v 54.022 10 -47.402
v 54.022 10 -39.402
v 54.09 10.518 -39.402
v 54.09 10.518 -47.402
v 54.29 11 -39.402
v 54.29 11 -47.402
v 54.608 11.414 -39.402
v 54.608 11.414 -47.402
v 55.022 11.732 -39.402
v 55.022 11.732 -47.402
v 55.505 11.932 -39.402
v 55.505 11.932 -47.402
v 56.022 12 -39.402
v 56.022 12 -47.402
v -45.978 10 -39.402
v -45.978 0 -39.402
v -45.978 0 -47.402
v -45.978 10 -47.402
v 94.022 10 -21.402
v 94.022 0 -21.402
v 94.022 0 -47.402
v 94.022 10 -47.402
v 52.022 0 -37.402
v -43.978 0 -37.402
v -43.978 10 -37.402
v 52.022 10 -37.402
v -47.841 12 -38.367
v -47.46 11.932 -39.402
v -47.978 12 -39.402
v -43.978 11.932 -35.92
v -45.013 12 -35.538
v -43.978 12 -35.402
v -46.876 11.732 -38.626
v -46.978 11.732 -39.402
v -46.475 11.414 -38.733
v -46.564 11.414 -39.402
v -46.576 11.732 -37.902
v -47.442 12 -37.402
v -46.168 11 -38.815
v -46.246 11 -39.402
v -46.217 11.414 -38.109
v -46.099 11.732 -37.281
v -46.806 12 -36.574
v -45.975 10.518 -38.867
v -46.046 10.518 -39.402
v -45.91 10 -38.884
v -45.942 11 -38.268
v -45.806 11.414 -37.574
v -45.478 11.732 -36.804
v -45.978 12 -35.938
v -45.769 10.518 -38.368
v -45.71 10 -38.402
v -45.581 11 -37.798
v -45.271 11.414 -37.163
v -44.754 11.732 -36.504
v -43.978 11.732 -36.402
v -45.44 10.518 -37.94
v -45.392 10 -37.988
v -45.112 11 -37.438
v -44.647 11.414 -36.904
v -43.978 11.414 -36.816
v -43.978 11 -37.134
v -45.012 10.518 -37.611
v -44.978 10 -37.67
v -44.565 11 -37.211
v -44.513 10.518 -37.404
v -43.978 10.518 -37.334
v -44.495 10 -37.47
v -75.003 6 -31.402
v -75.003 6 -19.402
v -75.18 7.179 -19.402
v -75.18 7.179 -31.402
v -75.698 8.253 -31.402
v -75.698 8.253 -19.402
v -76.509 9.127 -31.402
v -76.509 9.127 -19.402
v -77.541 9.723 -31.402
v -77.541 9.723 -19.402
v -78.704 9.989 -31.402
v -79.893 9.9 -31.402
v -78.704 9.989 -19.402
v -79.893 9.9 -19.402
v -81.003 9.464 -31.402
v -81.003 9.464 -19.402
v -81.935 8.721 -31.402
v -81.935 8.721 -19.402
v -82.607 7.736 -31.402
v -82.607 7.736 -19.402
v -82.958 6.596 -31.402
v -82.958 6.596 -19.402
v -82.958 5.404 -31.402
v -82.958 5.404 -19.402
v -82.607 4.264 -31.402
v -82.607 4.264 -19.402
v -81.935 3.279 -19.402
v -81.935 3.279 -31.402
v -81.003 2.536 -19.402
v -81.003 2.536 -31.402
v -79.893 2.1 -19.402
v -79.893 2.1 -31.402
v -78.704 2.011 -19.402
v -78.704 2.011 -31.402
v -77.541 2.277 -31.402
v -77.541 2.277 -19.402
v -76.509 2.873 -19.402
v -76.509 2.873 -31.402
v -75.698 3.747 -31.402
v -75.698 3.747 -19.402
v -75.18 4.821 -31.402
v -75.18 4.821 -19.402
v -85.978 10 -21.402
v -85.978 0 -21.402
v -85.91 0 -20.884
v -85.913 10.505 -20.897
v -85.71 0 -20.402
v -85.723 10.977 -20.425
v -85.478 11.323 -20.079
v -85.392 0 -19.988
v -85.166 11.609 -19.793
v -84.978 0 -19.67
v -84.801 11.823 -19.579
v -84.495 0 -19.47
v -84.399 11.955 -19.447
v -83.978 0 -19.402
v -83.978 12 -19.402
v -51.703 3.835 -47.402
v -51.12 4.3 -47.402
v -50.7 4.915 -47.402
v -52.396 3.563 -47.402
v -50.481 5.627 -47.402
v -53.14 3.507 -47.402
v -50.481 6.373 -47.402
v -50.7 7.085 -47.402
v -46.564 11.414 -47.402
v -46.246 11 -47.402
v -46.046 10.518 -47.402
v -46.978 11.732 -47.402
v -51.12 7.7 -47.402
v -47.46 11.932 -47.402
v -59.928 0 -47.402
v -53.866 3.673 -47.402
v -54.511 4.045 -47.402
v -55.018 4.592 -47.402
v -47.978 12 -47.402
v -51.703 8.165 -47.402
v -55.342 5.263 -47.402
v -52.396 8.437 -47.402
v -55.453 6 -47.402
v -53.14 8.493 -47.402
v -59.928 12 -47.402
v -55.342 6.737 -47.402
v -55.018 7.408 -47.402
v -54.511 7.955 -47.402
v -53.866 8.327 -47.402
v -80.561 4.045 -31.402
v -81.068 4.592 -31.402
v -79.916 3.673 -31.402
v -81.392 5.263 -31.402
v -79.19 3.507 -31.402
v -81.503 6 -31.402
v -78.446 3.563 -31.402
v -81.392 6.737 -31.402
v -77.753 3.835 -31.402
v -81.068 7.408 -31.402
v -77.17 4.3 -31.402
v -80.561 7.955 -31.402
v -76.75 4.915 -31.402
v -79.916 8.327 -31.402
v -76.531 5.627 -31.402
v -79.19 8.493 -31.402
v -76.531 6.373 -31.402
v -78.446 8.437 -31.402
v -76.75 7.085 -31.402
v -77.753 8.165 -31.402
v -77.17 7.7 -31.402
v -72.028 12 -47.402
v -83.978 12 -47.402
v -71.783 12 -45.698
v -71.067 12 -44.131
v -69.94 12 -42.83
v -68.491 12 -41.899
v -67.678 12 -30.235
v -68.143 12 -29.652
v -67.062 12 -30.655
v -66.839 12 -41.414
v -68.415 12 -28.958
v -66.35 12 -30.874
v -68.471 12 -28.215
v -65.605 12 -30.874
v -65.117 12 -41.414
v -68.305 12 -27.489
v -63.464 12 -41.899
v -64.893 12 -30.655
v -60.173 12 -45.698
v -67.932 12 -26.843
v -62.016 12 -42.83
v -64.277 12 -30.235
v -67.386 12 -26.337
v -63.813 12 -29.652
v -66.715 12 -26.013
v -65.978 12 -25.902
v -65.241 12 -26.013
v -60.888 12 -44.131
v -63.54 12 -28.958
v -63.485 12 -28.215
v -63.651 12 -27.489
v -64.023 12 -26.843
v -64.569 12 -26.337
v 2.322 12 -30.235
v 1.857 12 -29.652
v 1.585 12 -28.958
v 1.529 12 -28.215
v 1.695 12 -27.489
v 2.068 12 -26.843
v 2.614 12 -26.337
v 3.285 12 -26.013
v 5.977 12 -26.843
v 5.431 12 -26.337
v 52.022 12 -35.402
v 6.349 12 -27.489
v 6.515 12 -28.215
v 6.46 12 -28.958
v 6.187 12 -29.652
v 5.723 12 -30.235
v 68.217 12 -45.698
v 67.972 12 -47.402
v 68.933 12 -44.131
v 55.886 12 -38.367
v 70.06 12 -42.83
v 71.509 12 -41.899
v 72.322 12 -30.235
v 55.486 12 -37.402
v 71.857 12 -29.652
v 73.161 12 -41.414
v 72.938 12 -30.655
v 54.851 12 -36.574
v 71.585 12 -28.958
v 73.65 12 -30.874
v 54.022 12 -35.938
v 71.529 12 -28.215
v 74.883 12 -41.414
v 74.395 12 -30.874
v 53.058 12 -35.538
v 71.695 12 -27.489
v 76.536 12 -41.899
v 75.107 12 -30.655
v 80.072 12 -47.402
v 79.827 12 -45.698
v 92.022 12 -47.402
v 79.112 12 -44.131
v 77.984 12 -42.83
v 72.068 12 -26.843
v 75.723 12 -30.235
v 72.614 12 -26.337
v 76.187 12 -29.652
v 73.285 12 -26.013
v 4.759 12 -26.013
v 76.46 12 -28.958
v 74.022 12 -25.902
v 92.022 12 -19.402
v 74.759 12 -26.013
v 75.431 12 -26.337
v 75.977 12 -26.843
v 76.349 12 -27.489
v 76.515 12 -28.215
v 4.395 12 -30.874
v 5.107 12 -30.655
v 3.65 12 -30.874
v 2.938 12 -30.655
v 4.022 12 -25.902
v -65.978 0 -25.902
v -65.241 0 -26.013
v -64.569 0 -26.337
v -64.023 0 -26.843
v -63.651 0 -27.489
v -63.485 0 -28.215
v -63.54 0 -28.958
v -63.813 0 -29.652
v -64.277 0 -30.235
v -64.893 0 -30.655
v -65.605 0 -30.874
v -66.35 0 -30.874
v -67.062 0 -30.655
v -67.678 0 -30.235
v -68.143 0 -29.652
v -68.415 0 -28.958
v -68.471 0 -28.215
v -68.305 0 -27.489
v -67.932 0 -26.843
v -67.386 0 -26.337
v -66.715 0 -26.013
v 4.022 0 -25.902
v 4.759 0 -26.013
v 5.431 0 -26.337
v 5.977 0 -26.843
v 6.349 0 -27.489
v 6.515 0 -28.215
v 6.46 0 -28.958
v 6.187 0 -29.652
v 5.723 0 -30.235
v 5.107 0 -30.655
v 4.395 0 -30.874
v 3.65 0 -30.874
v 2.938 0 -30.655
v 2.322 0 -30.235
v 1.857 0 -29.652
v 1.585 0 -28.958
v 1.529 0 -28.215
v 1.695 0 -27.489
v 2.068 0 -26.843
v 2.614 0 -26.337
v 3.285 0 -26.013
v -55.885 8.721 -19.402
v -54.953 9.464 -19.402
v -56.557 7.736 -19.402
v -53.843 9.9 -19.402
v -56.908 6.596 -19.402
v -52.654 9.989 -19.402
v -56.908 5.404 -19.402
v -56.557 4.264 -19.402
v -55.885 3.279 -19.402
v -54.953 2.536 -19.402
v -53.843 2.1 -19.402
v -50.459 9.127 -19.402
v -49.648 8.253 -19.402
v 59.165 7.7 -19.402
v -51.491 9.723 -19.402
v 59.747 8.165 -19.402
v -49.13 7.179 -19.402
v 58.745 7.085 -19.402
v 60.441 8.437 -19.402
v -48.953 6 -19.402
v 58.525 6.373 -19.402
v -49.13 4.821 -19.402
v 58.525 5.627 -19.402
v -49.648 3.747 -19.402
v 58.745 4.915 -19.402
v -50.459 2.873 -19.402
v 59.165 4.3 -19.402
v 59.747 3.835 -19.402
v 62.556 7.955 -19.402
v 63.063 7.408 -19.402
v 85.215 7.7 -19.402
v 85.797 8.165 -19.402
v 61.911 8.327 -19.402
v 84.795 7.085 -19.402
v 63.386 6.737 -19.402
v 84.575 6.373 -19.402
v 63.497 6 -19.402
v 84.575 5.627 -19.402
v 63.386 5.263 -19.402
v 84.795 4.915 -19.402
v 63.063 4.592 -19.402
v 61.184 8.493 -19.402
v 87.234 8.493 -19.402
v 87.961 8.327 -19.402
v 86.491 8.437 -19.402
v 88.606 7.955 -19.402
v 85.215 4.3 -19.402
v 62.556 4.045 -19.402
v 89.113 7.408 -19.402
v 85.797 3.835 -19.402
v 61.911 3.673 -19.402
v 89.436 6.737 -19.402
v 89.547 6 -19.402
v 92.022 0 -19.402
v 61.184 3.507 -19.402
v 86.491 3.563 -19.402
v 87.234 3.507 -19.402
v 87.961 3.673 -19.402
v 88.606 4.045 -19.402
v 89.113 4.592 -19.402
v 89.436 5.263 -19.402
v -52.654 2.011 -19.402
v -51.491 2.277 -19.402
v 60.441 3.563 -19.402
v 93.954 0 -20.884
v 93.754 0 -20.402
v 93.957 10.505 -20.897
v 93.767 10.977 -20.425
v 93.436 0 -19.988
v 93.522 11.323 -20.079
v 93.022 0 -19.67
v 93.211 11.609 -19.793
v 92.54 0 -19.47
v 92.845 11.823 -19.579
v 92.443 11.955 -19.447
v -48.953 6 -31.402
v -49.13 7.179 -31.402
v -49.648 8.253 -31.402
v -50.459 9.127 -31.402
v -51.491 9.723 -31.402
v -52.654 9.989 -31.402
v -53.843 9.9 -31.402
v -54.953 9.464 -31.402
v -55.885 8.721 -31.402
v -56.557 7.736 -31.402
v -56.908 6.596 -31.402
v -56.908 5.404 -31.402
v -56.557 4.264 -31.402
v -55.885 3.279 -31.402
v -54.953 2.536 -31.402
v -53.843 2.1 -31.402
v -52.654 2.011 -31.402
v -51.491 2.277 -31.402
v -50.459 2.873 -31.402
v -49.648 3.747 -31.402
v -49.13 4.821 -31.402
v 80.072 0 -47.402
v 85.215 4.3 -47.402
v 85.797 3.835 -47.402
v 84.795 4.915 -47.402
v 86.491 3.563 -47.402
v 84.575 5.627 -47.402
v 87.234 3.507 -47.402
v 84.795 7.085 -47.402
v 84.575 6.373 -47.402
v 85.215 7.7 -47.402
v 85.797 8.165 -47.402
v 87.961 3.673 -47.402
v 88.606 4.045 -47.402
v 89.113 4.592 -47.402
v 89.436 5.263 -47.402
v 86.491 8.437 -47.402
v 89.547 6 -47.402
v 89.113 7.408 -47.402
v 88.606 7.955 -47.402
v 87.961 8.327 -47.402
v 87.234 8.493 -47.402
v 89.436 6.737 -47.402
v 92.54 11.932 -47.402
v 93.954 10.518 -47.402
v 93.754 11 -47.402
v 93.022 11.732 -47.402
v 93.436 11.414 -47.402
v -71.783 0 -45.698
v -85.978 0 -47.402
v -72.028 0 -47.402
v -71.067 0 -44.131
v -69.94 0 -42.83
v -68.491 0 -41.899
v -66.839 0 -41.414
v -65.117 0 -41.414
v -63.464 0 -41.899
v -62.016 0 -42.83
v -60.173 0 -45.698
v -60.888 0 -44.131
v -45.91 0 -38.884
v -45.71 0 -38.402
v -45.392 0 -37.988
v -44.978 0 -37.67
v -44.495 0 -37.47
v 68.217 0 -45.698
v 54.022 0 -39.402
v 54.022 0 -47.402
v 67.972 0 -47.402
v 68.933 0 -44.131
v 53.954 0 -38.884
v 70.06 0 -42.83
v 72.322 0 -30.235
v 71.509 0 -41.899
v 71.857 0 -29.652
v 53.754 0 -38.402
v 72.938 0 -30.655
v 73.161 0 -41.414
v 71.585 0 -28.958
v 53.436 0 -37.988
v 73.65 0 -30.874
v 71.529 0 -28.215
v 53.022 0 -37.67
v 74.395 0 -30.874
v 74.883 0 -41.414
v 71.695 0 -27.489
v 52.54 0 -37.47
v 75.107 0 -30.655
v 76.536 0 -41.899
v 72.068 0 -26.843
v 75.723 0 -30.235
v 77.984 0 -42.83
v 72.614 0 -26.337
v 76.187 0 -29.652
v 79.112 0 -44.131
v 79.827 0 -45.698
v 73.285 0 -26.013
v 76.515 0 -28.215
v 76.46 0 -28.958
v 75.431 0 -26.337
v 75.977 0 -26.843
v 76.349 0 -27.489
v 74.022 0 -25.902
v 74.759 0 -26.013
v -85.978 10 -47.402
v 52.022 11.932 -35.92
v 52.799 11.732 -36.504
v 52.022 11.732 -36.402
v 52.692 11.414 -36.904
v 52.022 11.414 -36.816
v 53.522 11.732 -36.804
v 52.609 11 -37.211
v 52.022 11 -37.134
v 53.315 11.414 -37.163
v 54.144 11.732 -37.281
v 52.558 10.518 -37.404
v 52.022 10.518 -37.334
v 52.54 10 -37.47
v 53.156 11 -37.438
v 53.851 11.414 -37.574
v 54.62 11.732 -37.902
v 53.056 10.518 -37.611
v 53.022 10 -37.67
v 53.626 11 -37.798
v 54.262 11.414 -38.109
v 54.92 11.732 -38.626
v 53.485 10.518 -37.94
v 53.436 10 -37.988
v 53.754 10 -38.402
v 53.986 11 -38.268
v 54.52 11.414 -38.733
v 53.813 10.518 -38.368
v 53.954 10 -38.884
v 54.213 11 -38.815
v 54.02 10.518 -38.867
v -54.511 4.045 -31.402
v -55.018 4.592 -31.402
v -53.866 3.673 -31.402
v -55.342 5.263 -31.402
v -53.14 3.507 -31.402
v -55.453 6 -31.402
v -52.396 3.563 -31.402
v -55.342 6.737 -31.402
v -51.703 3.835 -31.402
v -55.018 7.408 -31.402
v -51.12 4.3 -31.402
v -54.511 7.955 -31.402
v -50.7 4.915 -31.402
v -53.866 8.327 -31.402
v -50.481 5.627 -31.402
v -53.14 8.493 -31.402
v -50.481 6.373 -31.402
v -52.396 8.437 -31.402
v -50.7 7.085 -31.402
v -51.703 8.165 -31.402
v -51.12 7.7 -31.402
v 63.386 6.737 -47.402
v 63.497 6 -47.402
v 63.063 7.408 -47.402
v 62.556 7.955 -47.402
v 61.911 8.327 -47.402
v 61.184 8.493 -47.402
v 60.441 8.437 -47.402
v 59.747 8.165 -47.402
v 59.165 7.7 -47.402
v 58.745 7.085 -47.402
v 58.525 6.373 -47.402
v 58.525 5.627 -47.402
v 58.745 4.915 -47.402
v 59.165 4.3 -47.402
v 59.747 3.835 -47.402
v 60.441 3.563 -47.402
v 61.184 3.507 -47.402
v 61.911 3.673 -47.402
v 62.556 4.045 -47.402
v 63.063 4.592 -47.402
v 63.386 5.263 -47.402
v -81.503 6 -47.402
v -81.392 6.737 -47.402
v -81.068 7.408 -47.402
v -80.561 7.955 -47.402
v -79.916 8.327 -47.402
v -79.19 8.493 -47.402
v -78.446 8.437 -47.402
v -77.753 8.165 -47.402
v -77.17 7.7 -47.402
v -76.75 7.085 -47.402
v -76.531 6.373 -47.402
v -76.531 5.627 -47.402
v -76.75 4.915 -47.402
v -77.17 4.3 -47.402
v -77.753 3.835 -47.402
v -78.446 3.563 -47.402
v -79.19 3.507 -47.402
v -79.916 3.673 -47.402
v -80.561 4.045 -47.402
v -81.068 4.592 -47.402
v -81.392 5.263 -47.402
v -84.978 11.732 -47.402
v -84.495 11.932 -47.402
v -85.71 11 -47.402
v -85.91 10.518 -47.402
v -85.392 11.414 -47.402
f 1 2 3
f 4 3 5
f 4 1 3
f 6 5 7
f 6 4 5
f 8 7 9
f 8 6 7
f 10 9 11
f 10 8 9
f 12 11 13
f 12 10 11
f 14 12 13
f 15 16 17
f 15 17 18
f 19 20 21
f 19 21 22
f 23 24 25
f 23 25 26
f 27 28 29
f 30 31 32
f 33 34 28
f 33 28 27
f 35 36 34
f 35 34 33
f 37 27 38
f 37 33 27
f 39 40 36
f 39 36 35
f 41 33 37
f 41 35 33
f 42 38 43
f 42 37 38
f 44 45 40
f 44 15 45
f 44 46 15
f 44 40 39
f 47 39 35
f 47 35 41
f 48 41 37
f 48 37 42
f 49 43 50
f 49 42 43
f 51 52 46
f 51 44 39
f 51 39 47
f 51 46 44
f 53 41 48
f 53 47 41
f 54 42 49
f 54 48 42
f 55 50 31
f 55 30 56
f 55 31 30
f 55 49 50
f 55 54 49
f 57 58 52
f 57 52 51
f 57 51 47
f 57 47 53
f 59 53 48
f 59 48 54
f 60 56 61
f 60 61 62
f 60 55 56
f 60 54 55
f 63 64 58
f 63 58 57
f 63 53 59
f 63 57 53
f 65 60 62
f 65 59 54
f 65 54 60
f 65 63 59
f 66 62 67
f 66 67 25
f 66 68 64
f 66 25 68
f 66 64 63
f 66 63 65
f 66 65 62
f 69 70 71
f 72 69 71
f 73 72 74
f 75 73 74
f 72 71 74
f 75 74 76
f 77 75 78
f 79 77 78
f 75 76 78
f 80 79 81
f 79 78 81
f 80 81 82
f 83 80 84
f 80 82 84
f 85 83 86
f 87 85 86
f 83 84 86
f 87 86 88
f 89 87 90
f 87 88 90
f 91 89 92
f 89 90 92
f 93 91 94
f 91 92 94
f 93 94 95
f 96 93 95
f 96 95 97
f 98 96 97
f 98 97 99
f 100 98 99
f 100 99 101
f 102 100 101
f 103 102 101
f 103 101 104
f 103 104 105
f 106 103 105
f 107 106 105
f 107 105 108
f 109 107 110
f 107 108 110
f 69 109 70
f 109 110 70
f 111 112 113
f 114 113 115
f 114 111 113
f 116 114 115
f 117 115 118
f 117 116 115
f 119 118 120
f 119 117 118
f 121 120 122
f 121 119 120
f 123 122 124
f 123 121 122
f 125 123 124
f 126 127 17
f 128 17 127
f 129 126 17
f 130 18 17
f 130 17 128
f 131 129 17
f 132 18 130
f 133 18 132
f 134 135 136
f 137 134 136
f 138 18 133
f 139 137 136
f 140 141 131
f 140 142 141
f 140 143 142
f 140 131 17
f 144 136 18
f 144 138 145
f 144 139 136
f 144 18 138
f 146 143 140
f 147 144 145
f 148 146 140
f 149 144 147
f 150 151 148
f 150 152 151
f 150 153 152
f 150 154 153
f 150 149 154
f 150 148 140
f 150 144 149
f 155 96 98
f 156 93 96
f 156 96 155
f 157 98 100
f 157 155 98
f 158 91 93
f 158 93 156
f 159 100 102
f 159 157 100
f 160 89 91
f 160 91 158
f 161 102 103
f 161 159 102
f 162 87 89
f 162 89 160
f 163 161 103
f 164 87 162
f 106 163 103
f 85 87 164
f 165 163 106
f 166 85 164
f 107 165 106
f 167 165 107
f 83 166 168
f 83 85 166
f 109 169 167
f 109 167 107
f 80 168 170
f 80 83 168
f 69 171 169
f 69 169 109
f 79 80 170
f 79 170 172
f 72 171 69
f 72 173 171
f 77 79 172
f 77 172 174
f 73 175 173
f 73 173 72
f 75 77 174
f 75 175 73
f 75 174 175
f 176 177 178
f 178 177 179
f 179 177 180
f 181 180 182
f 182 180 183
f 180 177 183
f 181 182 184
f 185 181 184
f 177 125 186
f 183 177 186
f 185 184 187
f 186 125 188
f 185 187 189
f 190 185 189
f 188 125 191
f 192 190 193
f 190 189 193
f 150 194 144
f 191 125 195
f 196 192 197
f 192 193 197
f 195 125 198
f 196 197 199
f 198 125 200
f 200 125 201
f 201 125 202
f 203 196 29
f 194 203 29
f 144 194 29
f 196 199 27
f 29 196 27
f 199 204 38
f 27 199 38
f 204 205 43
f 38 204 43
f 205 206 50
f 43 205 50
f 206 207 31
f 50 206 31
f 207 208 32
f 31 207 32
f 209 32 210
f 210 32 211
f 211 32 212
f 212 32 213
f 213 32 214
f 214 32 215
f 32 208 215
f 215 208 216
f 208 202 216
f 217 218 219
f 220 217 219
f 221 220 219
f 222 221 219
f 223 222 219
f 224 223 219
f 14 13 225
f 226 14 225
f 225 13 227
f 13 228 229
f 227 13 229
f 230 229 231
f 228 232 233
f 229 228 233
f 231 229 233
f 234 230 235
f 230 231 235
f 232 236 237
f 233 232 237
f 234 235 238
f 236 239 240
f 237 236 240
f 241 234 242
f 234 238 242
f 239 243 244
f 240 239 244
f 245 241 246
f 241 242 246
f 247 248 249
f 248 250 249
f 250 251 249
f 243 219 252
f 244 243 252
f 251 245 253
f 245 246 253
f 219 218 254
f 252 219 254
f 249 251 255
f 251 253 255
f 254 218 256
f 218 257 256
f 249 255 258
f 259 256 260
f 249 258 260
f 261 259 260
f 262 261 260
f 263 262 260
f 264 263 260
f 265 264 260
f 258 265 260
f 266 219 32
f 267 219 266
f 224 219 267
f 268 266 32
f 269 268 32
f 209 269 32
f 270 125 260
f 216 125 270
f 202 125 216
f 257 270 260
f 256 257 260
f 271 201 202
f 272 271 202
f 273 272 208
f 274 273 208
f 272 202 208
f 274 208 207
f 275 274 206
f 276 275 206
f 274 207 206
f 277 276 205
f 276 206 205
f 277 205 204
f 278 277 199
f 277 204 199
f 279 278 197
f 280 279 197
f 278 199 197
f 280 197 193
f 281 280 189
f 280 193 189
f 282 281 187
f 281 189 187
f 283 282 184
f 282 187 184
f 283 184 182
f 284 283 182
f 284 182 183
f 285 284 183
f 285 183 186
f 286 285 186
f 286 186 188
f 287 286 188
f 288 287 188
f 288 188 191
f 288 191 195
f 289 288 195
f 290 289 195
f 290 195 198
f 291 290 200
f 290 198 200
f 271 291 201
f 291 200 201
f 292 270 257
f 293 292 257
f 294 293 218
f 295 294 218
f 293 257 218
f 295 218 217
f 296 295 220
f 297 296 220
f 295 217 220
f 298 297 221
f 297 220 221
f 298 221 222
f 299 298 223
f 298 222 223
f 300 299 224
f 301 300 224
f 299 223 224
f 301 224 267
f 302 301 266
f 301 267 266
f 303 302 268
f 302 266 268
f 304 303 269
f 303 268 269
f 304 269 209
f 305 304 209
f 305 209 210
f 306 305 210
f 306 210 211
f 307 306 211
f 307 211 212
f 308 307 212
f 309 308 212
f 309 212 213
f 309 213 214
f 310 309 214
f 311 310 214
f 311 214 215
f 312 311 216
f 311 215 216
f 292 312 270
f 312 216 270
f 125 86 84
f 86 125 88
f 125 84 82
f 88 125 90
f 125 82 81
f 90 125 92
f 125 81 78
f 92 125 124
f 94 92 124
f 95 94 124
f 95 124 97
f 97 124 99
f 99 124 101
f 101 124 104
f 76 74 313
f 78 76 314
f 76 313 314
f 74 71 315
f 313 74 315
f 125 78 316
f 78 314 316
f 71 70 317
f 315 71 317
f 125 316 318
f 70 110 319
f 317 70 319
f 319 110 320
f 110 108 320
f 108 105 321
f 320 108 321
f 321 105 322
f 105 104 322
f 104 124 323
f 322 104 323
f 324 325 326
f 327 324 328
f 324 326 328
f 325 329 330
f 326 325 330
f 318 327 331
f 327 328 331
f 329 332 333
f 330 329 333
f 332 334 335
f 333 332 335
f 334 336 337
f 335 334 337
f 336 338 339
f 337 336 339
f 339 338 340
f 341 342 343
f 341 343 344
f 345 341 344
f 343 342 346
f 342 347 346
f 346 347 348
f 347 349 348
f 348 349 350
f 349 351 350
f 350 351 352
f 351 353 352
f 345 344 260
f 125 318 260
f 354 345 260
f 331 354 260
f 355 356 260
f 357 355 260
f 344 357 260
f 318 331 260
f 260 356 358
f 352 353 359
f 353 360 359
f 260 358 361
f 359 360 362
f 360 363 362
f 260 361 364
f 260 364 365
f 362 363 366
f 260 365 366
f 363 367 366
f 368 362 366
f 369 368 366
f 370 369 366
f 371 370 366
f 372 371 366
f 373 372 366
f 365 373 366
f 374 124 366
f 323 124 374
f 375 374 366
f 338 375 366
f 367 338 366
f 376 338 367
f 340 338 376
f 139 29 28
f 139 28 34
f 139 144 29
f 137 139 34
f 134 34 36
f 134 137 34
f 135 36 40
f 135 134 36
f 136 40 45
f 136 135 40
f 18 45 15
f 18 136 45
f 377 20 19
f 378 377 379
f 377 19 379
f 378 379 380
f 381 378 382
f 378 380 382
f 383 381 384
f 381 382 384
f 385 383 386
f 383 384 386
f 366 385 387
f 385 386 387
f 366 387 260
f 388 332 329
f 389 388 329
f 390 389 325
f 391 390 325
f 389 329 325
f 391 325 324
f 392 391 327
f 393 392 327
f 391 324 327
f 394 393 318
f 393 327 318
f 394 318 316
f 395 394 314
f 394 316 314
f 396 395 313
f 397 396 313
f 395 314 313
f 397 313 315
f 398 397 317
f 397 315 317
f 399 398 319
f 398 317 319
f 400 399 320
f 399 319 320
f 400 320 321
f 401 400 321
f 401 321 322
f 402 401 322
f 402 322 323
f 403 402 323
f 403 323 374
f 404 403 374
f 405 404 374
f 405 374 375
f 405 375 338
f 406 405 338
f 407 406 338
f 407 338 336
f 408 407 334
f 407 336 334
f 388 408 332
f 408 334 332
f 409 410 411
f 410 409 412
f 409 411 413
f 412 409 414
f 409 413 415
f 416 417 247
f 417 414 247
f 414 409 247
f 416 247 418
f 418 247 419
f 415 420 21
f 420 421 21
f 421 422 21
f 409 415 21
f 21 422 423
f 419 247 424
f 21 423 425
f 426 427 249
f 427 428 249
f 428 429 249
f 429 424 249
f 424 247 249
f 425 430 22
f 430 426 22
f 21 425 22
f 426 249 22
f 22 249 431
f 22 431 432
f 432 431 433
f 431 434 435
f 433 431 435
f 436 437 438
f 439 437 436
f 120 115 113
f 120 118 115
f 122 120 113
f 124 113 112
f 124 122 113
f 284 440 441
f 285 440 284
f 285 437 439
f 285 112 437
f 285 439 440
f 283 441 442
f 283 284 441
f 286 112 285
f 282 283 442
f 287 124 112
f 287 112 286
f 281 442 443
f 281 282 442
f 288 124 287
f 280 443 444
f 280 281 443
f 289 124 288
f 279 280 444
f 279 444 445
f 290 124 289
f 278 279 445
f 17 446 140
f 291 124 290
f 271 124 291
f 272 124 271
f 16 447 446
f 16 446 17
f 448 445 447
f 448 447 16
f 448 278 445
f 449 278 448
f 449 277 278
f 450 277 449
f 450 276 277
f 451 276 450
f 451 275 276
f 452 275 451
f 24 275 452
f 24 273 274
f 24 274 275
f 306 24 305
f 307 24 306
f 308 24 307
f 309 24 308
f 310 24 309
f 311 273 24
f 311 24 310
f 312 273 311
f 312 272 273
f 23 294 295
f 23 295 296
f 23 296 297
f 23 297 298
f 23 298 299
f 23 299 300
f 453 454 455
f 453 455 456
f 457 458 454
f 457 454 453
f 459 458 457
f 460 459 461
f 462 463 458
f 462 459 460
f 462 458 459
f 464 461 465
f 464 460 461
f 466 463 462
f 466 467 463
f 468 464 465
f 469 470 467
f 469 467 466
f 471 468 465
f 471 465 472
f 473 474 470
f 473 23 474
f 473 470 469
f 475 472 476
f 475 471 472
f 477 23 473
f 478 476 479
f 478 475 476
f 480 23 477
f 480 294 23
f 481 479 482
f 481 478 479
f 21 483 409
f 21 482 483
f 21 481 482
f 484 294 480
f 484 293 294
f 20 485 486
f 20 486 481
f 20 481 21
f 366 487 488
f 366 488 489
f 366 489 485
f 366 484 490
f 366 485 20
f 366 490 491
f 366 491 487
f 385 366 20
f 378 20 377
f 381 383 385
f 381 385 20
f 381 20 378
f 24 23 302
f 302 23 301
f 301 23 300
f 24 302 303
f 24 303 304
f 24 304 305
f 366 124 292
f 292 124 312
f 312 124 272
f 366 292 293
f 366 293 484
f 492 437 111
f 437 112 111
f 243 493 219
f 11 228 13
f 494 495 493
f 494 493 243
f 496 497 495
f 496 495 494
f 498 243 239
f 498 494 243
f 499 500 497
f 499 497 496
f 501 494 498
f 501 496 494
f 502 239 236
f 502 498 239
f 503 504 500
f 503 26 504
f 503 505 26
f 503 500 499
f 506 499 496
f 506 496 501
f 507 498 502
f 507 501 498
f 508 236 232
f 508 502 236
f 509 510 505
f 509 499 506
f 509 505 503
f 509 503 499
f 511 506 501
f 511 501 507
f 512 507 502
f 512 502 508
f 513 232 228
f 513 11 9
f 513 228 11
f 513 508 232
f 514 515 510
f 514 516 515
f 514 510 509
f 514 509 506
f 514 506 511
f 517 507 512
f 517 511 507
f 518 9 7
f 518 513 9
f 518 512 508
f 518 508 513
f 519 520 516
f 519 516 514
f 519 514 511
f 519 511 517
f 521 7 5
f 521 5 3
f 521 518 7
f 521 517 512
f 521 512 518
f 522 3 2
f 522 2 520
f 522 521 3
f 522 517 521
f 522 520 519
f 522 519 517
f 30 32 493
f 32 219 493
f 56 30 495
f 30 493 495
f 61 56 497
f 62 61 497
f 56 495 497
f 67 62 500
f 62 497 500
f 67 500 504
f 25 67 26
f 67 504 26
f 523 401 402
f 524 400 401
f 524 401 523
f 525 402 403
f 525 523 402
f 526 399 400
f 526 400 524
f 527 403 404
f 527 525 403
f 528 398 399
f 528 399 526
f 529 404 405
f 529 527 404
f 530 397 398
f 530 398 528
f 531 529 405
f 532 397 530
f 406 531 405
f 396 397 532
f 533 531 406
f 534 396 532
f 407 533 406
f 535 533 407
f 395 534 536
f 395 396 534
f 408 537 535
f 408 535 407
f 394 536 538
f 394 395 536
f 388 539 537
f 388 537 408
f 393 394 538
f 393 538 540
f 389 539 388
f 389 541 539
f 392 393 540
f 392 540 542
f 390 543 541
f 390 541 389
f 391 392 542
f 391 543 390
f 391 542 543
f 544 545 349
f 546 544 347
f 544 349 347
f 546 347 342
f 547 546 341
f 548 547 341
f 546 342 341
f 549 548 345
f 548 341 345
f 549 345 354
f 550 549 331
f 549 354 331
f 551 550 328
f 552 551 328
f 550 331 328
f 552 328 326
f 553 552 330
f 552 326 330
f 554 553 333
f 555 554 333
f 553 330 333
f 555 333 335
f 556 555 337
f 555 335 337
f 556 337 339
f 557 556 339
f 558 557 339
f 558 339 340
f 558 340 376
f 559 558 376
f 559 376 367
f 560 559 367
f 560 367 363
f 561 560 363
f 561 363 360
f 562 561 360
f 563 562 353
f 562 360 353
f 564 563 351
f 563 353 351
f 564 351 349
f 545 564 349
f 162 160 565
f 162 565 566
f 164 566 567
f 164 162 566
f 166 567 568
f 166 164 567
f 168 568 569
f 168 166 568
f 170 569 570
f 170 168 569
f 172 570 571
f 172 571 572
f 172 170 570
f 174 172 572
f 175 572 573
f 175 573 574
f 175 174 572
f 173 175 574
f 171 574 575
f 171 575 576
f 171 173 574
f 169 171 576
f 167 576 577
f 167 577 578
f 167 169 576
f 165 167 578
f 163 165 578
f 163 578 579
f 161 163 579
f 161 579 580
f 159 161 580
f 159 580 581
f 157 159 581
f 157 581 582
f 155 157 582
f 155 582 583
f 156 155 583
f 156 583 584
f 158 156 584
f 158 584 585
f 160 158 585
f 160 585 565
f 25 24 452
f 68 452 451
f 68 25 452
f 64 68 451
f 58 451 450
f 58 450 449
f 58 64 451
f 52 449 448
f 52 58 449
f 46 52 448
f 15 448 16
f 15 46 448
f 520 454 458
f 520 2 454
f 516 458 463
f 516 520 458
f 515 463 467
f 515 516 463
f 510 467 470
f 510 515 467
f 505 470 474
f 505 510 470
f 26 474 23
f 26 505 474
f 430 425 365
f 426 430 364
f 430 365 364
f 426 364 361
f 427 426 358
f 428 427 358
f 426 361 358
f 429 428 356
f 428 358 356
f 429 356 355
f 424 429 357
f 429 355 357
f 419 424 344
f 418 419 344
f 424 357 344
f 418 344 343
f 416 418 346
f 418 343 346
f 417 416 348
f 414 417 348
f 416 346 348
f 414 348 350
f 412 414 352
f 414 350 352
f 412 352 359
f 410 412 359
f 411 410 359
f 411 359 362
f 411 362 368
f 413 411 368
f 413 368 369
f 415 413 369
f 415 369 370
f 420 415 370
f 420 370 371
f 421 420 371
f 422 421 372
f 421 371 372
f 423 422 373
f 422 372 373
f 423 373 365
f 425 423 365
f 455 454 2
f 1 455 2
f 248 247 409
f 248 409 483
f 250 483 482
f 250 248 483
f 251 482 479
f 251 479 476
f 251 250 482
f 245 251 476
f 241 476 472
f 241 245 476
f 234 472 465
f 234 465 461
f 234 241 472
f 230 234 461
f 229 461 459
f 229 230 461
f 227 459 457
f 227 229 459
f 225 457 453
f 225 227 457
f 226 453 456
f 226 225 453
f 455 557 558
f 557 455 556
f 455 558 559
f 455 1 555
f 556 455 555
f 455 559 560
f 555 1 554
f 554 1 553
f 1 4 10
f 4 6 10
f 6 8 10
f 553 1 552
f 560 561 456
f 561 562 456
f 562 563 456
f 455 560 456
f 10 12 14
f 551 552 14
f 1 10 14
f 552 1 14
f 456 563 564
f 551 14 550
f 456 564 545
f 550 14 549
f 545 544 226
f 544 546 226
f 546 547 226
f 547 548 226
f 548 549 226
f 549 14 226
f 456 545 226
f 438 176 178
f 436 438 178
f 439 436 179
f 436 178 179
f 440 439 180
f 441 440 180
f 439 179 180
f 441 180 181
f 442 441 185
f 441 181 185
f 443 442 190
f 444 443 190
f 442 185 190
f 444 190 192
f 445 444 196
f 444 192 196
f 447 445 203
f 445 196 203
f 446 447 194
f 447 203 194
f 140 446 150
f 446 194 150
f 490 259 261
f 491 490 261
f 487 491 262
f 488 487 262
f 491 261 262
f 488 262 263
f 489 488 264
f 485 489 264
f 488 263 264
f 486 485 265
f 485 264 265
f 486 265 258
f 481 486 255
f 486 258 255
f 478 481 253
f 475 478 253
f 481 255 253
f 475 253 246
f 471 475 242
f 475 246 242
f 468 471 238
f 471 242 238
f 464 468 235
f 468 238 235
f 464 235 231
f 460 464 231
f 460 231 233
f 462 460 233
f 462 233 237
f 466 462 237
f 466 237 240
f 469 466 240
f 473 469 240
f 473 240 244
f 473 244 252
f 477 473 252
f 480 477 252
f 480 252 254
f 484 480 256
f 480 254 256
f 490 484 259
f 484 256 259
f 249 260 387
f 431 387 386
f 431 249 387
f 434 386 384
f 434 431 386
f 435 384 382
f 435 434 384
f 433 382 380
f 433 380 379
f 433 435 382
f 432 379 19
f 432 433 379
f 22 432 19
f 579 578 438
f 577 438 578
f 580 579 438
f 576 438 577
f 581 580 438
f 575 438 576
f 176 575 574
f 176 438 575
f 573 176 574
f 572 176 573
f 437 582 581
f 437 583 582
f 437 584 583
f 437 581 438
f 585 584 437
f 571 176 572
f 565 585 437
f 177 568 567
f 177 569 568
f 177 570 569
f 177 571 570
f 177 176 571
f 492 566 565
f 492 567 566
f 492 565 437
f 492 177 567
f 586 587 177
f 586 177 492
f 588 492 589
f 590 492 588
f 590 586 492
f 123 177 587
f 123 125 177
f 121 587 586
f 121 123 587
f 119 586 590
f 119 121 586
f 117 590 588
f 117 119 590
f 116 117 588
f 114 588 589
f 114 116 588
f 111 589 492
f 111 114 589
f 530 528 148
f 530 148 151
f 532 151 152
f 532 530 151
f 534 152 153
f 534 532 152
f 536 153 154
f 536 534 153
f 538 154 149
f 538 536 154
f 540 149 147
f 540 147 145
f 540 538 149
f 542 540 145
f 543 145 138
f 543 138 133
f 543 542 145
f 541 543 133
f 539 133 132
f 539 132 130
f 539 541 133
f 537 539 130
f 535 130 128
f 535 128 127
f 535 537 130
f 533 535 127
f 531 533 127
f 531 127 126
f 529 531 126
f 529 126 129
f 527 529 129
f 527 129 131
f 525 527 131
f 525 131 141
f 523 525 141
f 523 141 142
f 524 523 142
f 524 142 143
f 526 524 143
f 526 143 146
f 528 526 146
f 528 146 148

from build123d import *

# Parameters (mm, degrees)
ESQUISSE1_W             = 180
ESQUISSE1_H             = 18
BOSS_EXTRU_1_DEPTH      = 12
ESQUISSE3_W             = 40
ESQUISSE3_H             = 12
BOSS_EXTRU_2_DEPTH      = 10
ESQUISSE4_R             = 6.05
ENL_V_MAT_EXTRU_1_DEPTH = 12
ENL_V_START             = -28
ESQUISSE5_R             = 2.5
ENL_V_MAT_EXTRU_2_DEPTH = 28
ESQUISSE6_R             = 4
ENL_V_MAT_EXTRU_3_DEPTH = 12
ESQUISSE9_R             = 2.5
ENL_V_MAT_EXTRU_4_DEPTH = 12
CONG_1_R                = 2


with BuildPart() as part:
    # Esquisse1 → Boss.-Extru.1 (new body)
    with BuildSketch(Plane(origin=(0, 0, 0), x_dir=(1, 0, 0), z_dir=(0, 1, 0))):
        with Locations((4.022267576, 28.402118524)):
            Rectangle(ESQUISSE1_W, ESQUISSE1_H)
    extrude(amount=BOSS_EXTRU_1_DEPTH)

    # Esquisse3 → Boss.-Extru.2 (add)
    with BuildSketch(Plane(origin=(0, 0, -37.402118524), x_dir=(-1, 0, 0), z_dir=(0, 0, -1))):
        with Locations((65.977732424, 6)):
            Rectangle(ESQUISSE3_W, ESQUISSE3_H)
    boss_extru_2 = extrude(amount=BOSS_EXTRU_2_DEPTH)

    # Esquisse4 → Enlèv. mat.-Extru.1 (cut)
    with BuildSketch(Plane(origin=(0, 12, 0), x_dir=(1, 0, 0), z_dir=(0, 1, 0))):
        with Locations((-65.977732424, 47.402118524)):
            Circle(ESQUISSE4_R)
    enl_v_mat_extru_1 = extrude(amount=-ENL_V_MAT_EXTRU_1_DEPTH, mode=Mode.SUBTRACT)

    # Esquisse5 → Enlèv. mat.-Extru.2 (cut)
    with BuildSketch(Plane(origin=(0, 0, -47.402118524), x_dir=(-1, 0, 0), z_dir=(0, 0, -1)).offset(ENL_V_START)):
        with Locations((52.952732424, 6)):
            Circle(ESQUISSE5_R)
        with Locations((79.002732424, 6)):
            Circle(ESQUISSE5_R)
    enl_v_mat_extru_2 = extrude(amount=ENL_V_MAT_EXTRU_2_DEPTH, mode=Mode.SUBTRACT)

    # Esquisse6 → Enlèv. mat.-Extru.3 (cut)
    with BuildSketch(Plane.XY.offset(-19.402118524)):
        with Locations((-52.952732424, 6)):
            Circle(ESQUISSE6_R)
        with Locations((-79.002732424, 6)):
            Circle(ESQUISSE6_R)
    extrude(amount=-ENL_V_MAT_EXTRU_3_DEPTH, mode=Mode.SUBTRACT)

    # Symétrie4: Boss.-Extru.2, Enlèv. mat.-Extru.1, Enlèv. mat.-Extru.2 across plane
    add(boss_extru_2.mirror(Plane(origin=(4.022267576, 12, -19.402118524), x_dir=(0, 0, 1), z_dir=(-1, 0, 0))))
    add(enl_v_mat_extru_1.mirror(Plane(origin=(4.022267576, 12, -19.402118524), x_dir=(0, 0, 1), z_dir=(-1, 0, 0))), mode=Mode.SUBTRACT)
    add(enl_v_mat_extru_2.mirror(Plane(origin=(4.022267576, 12, -19.402118524), x_dir=(0, 0, 1), z_dir=(-1, 0, 0))), mode=Mode.SUBTRACT)

    # Esquisse9 → Enlèv. mat.-Extru.4 (cut)
    with BuildSketch(Plane(origin=(0, 12, 0), x_dir=(1, 0, 0), z_dir=(0, 1, 0))):
        with Locations(Location((4.022267576, 28.402118524, 0), (0, 0, 270))):
            Circle(ESQUISSE9_R)
        with Locations(Location((74.022267576, 28.402118524, 0), (0, 0, 270))):
            Circle(ESQUISSE9_R)
        with Locations(Location((-65.977732424, 28.402118524, 0), (0, 0, 270))):
            Circle(ESQUISSE9_R)
    extrude(amount=-ENL_V_MAT_EXTRU_4_DEPTH, mode=Mode.SUBTRACT)

    # Congé1
    cong_1_edges = [part.edges().sort_by_distance(p)[0] for p in [
        (94.022267576, 12, -33.402118524),
        (-45.977732424, 6, -37.402118524),
        (-45.977732424, 12, -42.402118524),
        (-85.977732424, 12, -33.402118524),
        (4.022267576, 12, -37.402118524),
        (54.022267576, 12, -42.402118524),
        (54.022267576, 6, -37.402118524),
        (94.022267576, 6, -19.402118524),
        (-85.977732424, 6, -19.402118524),
    ]]
    fillet(cong_1_edges, radius=CONG_1_R)


solid = part.part
